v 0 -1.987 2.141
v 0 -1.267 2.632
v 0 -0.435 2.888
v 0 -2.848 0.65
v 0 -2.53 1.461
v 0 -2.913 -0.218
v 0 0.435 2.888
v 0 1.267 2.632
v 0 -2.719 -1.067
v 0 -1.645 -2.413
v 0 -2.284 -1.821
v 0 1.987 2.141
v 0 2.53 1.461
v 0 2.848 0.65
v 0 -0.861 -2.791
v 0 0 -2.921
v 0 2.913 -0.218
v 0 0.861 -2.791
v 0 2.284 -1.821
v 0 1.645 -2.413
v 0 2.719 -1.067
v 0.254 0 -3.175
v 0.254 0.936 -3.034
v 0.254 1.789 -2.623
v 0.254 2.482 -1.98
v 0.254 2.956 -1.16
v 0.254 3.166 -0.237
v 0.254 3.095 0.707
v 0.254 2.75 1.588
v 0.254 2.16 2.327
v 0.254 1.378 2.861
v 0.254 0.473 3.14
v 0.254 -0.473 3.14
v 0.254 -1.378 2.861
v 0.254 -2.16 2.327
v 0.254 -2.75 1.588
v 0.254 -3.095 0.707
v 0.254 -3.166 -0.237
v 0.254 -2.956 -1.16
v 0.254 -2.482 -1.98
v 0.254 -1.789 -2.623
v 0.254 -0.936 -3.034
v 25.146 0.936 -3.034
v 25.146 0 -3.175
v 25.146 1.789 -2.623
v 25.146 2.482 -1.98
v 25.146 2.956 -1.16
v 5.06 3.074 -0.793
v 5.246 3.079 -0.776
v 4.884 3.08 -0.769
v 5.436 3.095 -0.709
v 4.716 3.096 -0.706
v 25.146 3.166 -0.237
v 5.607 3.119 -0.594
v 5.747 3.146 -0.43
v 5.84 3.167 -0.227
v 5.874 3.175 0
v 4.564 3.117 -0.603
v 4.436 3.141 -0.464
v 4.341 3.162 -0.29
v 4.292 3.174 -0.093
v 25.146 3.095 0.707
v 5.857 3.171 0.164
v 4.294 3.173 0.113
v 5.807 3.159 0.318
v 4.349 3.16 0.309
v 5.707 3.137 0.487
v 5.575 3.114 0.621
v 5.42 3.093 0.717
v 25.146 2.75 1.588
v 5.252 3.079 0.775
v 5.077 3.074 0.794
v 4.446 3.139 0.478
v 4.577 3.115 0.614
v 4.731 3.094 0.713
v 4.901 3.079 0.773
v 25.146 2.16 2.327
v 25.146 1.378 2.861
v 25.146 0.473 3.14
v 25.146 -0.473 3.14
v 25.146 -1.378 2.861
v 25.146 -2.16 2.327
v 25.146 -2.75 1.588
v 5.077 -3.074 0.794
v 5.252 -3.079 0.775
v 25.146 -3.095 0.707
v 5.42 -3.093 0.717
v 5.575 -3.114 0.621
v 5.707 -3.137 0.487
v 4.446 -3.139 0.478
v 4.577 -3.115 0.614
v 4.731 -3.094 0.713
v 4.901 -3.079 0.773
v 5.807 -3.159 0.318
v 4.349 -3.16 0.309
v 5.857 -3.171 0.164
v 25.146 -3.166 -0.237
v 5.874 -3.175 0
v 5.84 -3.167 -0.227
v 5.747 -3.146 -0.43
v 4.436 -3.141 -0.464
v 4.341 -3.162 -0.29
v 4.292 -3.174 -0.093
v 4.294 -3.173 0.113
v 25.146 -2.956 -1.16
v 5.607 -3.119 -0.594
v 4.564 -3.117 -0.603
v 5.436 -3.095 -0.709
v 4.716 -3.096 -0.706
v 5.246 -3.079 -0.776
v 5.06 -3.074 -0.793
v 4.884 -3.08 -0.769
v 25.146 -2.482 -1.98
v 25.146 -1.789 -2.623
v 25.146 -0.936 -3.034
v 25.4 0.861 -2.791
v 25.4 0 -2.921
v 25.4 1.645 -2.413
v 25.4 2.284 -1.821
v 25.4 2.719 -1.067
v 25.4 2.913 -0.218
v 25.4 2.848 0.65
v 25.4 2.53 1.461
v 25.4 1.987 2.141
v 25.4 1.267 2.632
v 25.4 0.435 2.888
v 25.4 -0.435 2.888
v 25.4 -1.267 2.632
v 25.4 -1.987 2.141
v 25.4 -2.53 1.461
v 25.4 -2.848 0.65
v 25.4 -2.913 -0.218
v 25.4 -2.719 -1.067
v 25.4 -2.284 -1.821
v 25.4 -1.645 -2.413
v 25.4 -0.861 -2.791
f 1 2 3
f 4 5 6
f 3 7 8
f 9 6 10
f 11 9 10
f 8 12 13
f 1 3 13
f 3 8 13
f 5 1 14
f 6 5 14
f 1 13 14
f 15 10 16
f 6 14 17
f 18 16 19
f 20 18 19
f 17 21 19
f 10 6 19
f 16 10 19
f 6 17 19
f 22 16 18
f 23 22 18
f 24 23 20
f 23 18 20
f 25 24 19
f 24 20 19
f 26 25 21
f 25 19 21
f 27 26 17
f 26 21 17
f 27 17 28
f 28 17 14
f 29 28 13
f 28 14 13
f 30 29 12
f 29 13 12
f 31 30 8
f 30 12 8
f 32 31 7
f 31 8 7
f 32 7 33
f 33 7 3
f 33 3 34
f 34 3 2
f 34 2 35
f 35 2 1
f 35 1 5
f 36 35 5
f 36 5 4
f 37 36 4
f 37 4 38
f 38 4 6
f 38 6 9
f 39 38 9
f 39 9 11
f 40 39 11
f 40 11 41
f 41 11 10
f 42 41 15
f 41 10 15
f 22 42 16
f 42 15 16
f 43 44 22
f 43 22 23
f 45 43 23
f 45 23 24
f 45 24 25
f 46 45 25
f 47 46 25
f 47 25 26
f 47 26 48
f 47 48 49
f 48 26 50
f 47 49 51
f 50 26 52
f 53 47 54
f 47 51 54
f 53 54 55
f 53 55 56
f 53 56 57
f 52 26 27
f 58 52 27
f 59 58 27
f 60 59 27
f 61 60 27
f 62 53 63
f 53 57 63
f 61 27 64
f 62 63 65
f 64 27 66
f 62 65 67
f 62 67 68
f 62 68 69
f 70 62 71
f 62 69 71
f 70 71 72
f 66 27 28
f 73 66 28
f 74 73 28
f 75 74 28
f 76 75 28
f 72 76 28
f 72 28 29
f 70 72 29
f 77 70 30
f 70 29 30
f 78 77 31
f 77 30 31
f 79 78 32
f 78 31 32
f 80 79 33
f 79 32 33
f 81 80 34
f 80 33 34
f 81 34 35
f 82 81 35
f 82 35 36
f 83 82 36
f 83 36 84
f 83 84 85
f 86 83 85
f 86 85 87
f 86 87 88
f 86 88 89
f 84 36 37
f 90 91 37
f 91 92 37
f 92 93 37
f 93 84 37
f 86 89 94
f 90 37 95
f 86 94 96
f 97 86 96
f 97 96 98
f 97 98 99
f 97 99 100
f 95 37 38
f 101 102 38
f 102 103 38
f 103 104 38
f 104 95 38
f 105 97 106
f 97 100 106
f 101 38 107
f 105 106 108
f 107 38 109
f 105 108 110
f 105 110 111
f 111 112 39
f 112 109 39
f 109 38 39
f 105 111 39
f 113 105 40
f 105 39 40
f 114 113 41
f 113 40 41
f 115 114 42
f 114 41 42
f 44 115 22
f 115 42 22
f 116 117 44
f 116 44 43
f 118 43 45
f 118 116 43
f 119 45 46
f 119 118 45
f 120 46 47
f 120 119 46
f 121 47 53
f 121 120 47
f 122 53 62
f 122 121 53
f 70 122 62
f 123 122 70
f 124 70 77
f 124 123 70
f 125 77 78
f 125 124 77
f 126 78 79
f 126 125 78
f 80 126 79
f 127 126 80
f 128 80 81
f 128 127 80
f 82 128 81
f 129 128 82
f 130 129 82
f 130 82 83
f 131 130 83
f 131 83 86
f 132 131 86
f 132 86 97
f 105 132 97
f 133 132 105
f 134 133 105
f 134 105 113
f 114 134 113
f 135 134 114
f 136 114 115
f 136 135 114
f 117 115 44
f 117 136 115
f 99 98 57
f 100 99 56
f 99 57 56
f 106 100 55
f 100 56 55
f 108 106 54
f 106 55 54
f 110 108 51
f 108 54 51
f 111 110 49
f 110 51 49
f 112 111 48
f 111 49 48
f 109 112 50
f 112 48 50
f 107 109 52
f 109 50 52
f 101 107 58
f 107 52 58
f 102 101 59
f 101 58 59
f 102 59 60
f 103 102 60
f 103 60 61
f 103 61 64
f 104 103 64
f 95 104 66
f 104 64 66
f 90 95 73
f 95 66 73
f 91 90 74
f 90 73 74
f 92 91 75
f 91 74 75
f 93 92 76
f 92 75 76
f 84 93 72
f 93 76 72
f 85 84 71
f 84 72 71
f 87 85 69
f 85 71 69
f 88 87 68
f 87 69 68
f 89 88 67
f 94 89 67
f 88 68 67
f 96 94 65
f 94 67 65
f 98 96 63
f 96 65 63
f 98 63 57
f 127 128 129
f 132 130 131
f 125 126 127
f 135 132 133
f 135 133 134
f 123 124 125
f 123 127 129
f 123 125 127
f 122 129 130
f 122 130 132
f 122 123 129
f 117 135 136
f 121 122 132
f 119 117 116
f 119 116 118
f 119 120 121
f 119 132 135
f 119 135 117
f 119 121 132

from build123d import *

# Parameters (mm, degrees)
SKETCH2_R               = 3.175
BOSS_EXTRUDE1_DEPTH     = 25.4
CHAMFER1_SIZE           = 0.254
SKETCH4_R               = 0.79375
CUT_EXTRUDE2_DEPTH      = 4.175
CUT_EXTRUDE2_DEPTH_BACK = 4.175


with BuildPart() as part:
    # Sketch2 → Boss-Extrude1 (new body)
    with BuildSketch(Plane(origin=(0, 0, 0), x_dir=(0, 0, -1), z_dir=(1, 0, 0))):
        Circle(SKETCH2_R)
    extrude(amount=BOSS_EXTRUDE1_DEPTH)

    # Chamfer1
    chamfer1_edges = [part.edges().sort_by_distance(p)[0] for p in [
        (0, 0, 3.175),
        (25.4, 0, 3.175),
    ]]
    chamfer(chamfer1_edges, length=CHAMFER1_SIZE)

    # Sketch4 → Cut-Extrude2 (cut, two sides)
    with BuildSketch(Plane(origin=(0, 0, 0), x_dir=(1, 0, 0), z_dir=(0, 1, 0))) as cut_extrude2_sk:
        with Locations((5.08, 0)):
            Circle(SKETCH4_R)
    extrude(amount=CUT_EXTRUDE2_DEPTH, mode=Mode.SUBTRACT)
    extrude(cut_extrude2_sk.sketch, amount=-CUT_EXTRUDE2_DEPTH_BACK, mode=Mode.SUBTRACT)


solid = part.part
